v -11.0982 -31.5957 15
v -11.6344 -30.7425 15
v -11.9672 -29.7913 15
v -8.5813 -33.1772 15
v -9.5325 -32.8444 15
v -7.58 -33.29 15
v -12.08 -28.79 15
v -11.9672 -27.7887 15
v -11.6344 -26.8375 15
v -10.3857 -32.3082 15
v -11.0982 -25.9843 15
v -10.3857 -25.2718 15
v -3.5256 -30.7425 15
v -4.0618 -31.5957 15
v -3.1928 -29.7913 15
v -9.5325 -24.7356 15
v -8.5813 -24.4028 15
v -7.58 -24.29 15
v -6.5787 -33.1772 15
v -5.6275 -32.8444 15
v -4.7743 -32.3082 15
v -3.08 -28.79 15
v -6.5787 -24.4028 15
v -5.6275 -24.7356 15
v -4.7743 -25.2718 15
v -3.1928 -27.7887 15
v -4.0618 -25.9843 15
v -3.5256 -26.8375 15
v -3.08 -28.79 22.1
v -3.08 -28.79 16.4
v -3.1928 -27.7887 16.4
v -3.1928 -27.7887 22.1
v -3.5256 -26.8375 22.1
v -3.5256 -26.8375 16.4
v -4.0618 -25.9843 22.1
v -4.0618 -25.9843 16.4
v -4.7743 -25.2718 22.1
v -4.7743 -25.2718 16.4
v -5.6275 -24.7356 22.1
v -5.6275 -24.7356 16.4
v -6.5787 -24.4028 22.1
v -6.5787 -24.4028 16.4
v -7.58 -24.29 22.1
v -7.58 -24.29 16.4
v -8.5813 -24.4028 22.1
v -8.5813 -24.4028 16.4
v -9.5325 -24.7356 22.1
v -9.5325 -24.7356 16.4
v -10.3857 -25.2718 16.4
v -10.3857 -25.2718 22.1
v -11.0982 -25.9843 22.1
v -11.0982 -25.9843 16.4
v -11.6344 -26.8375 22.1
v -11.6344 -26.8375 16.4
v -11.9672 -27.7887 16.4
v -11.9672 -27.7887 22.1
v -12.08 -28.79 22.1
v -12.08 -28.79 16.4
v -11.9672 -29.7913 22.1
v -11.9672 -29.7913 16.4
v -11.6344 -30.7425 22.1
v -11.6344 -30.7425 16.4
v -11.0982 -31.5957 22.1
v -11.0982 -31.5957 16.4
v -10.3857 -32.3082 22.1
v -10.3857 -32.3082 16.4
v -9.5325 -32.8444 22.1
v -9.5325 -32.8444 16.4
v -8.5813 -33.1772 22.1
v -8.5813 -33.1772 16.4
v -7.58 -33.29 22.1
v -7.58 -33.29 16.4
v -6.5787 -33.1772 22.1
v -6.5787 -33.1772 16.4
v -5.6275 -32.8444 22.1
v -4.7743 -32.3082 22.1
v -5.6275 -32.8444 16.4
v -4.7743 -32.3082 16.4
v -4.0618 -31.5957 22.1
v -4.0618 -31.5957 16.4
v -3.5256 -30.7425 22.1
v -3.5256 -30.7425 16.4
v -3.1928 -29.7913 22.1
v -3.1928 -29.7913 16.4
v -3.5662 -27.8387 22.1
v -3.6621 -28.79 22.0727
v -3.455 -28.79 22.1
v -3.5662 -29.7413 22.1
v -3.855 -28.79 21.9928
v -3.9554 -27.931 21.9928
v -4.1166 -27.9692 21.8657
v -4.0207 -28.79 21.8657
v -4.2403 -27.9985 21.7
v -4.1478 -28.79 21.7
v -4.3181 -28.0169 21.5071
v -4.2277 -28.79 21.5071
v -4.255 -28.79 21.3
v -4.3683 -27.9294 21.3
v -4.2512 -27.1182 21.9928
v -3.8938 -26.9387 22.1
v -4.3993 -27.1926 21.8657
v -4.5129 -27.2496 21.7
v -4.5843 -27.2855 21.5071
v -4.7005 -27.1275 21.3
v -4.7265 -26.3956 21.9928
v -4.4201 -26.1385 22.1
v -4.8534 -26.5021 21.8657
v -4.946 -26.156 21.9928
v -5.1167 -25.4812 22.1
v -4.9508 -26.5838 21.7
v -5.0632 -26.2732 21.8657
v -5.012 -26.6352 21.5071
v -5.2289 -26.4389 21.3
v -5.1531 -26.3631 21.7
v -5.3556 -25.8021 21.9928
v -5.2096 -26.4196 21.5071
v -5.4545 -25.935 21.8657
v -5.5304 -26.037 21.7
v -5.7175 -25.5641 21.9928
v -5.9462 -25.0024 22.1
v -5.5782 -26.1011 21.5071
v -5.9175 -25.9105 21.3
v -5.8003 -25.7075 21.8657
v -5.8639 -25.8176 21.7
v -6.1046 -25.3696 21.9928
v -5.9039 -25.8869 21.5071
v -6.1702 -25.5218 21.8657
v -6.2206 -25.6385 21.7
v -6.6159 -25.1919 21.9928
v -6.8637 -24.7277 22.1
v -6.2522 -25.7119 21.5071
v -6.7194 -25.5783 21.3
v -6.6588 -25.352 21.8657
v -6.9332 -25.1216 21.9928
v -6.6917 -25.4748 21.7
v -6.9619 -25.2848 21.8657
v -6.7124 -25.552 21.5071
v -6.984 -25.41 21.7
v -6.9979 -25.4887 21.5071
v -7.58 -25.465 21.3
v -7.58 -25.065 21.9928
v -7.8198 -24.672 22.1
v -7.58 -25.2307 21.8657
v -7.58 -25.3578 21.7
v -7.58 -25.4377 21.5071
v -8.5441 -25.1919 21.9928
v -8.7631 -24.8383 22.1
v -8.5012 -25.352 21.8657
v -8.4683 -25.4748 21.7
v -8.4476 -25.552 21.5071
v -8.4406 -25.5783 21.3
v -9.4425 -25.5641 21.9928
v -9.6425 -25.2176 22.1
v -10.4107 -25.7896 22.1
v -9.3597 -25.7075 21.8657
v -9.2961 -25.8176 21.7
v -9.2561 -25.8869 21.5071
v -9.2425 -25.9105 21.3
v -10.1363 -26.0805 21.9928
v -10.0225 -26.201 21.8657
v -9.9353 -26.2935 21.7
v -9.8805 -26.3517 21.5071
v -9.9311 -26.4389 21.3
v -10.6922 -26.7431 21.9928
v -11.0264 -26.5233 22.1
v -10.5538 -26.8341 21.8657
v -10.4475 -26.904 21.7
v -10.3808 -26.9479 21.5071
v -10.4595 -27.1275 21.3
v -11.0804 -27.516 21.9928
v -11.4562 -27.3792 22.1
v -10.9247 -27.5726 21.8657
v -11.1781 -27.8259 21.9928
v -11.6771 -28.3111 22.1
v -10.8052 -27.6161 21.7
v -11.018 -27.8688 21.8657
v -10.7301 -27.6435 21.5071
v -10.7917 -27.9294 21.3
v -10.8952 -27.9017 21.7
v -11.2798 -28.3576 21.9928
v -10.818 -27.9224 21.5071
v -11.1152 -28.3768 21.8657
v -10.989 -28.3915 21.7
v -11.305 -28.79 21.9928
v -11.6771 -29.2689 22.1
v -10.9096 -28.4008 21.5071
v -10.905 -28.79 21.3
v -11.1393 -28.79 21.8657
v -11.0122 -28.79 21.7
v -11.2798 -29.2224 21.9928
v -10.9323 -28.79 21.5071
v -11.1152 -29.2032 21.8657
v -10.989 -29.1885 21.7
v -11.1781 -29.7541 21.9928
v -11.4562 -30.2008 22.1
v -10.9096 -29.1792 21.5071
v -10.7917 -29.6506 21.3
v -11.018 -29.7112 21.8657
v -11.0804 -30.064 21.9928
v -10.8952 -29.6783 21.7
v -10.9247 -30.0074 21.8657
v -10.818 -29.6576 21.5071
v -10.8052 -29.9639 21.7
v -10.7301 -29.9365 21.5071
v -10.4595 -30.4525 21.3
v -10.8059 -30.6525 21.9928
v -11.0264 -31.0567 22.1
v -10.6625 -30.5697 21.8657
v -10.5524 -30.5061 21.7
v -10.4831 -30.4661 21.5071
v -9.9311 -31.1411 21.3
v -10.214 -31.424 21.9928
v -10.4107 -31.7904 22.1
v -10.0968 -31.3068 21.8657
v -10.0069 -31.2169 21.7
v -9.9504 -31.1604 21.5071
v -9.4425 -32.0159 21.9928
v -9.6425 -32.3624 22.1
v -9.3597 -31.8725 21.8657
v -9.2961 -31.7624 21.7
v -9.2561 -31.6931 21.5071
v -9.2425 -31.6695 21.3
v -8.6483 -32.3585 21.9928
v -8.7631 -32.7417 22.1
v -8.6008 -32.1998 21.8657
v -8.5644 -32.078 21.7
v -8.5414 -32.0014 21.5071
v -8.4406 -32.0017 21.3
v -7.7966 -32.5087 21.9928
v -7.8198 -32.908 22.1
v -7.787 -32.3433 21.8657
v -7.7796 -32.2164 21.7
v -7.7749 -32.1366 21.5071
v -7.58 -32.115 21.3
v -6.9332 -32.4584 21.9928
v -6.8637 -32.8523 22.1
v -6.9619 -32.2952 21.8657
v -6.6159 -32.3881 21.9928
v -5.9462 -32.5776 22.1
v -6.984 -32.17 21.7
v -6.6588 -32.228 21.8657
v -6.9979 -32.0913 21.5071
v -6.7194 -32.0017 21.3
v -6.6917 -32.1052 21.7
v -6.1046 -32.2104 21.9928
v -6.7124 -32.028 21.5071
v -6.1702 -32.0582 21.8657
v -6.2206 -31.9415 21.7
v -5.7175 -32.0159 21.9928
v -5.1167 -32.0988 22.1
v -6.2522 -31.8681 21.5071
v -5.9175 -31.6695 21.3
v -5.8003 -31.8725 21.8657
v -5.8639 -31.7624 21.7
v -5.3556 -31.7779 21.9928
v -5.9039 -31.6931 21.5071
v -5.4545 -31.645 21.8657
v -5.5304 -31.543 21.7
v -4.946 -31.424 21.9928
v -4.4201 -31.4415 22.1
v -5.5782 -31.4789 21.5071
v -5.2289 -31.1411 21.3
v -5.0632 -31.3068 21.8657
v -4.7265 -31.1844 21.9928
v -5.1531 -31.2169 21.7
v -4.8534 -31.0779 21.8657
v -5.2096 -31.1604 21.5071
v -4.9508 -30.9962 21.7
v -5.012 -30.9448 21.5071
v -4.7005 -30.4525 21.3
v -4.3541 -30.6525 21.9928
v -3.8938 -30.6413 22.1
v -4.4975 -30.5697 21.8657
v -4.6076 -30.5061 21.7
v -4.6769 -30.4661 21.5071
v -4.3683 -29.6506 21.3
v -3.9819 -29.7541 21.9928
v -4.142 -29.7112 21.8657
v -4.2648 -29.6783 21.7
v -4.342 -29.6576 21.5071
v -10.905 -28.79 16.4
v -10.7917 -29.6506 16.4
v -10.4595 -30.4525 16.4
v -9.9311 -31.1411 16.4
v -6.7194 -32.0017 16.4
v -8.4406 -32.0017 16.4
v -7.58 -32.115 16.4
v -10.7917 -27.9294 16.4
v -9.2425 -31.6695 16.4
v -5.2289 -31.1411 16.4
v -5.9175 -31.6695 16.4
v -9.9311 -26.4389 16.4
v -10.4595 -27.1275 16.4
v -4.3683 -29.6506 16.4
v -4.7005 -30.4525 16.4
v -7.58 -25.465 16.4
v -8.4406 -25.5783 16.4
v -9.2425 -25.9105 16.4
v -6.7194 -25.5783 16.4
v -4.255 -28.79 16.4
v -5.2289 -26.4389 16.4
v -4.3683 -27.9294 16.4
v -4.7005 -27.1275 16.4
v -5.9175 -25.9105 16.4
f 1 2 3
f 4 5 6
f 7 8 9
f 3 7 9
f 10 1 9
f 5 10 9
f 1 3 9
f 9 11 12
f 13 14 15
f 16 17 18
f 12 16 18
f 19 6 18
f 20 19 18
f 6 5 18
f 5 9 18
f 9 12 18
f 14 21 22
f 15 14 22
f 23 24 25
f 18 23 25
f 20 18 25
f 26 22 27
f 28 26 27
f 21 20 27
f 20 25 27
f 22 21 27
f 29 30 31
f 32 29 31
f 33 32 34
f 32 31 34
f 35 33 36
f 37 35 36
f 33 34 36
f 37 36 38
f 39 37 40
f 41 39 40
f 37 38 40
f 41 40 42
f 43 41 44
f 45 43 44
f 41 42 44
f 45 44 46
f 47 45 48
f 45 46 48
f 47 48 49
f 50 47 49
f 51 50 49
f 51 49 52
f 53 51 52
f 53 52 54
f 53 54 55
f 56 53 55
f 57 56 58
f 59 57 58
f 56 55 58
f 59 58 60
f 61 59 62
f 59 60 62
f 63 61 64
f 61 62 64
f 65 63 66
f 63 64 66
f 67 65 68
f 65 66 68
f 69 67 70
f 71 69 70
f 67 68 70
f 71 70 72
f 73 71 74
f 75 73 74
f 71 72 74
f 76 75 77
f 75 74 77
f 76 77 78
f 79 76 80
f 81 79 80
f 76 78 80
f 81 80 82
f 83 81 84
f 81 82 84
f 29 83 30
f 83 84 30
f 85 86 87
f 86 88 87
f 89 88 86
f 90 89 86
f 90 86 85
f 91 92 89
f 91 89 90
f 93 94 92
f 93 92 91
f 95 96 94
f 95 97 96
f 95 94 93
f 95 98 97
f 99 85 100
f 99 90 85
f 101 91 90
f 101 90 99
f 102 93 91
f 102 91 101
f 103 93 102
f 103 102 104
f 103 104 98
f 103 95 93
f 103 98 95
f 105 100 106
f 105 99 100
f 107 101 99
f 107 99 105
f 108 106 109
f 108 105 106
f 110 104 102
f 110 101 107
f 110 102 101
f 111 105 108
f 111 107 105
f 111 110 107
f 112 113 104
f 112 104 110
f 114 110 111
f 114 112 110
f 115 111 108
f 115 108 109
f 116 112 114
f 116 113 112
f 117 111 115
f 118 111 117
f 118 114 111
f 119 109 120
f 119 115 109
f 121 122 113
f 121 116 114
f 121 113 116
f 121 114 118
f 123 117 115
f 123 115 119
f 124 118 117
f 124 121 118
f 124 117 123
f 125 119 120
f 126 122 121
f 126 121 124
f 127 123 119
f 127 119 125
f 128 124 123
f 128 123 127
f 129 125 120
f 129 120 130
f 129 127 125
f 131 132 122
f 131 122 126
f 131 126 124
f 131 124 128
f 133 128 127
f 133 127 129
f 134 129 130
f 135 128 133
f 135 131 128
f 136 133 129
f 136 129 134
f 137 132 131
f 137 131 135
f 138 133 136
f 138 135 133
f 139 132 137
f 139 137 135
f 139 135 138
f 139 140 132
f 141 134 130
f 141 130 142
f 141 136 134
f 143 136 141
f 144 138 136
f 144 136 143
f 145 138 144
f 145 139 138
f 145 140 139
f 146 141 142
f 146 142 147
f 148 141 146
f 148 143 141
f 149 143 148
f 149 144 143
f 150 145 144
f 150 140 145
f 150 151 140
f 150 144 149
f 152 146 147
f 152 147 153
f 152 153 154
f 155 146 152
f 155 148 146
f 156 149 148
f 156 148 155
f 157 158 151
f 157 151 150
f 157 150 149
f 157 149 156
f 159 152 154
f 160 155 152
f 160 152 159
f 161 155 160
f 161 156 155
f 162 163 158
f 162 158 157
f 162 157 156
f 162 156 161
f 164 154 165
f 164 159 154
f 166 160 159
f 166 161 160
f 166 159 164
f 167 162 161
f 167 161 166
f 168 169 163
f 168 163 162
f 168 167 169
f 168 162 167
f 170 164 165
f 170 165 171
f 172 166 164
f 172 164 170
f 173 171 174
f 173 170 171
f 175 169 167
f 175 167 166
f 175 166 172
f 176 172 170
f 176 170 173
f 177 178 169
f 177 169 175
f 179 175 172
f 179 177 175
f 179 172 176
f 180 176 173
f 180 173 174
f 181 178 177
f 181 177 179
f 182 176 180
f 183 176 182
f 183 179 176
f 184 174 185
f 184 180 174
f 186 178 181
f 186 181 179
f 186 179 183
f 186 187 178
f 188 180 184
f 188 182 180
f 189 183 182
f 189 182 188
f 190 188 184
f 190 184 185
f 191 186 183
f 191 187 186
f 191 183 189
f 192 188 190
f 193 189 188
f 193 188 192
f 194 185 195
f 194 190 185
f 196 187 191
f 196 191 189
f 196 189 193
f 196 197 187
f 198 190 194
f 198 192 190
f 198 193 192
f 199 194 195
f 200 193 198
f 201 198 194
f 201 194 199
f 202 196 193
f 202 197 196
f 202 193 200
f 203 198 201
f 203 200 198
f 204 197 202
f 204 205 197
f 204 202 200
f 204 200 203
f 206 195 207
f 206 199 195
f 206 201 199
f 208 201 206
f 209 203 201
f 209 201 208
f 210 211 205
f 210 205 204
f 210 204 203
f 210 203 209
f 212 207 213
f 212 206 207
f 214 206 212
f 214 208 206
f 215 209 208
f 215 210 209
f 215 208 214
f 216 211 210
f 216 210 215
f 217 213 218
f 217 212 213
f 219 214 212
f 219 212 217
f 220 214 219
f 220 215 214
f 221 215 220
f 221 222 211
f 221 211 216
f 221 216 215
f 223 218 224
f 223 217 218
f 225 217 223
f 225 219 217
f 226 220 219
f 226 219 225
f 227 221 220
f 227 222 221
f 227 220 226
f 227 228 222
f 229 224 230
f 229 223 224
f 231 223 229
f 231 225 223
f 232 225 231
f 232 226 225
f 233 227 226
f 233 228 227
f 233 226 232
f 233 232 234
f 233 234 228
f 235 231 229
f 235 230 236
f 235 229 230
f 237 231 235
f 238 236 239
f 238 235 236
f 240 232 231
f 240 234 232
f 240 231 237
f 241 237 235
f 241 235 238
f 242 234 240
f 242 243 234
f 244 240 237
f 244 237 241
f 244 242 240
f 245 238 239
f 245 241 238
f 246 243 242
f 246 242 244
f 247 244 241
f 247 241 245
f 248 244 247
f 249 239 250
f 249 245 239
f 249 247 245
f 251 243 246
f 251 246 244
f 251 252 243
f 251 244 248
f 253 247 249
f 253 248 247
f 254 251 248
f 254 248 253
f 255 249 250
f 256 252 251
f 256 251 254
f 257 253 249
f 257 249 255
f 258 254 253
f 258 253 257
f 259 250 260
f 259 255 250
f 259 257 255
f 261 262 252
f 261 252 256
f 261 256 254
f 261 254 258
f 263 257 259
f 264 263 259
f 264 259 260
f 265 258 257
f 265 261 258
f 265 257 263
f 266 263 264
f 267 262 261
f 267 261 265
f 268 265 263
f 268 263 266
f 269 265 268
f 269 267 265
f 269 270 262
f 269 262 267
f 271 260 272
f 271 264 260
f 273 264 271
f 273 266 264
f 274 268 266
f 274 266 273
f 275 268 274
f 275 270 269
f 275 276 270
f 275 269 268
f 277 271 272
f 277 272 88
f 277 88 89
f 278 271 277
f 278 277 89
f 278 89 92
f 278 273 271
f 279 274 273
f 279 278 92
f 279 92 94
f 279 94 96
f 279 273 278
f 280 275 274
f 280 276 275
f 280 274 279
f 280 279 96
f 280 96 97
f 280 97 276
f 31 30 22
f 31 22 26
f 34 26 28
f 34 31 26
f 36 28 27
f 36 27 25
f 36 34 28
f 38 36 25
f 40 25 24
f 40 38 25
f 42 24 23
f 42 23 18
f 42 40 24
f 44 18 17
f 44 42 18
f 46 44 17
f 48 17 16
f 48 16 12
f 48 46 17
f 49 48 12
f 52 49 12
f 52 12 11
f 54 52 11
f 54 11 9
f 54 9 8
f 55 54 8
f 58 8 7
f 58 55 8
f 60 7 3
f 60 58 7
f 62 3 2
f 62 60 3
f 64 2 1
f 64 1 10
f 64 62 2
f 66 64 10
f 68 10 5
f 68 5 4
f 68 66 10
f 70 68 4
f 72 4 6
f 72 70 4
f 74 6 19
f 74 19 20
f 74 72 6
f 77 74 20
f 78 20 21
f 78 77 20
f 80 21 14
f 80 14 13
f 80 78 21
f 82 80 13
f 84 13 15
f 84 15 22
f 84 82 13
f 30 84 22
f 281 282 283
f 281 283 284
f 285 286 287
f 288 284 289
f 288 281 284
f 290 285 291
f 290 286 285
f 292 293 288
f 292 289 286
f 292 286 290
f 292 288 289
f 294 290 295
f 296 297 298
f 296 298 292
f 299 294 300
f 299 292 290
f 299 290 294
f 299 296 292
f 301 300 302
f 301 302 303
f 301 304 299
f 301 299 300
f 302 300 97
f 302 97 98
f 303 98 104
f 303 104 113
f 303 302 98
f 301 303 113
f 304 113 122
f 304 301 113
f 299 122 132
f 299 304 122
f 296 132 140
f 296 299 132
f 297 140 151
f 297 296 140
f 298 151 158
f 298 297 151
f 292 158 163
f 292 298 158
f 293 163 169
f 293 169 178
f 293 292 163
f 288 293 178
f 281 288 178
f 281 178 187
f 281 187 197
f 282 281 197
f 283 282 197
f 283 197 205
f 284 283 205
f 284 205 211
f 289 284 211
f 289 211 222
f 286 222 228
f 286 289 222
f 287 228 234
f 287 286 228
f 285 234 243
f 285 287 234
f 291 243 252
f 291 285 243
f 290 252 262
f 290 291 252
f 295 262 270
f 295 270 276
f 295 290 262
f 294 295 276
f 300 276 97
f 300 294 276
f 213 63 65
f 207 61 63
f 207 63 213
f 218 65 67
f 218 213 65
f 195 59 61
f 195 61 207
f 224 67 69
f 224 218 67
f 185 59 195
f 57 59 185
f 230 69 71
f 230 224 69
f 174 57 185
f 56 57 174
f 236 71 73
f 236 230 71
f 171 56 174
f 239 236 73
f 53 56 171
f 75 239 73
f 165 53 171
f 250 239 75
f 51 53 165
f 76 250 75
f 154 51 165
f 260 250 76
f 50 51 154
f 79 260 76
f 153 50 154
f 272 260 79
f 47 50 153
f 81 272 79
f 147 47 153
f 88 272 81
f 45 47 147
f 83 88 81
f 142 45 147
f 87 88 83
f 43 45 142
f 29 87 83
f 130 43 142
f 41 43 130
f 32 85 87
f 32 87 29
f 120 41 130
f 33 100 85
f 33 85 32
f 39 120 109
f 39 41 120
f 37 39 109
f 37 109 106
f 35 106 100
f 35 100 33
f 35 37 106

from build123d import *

# Parameters (mm, degrees)
SKETCH064_R     = 4.5
PAD029_DEPTH    = 1.4
SKETCH065_R     = 4.5
PAD030_DEPTH    = 5.7
SKETCH066_R     = 3.325
POCKET031_DEPTH = 5.7
FILLET002_R     = 0.8


with BuildPart() as part:
    # Sketch064 → Pad029 (new body)
    with BuildSketch(Plane.XY):
        with Locations((-7.58, -28.79)):
            Circle(SKETCH064_R)
    extrude(amount=-PAD029_DEPTH)

    # Sketch065 → Pad030 (join)
    with BuildSketch(Plane.XY):
        with Locations((-7.58, -28.79)):
            Circle(SKETCH065_R)
    extrude(amount=PAD030_DEPTH)

    # Sketch066 → Pocket031 (cut)
    with BuildSketch(Plane.XY):
        with Locations((-7.58, -28.79)):
            Circle(SKETCH066_R)
    extrude(amount=POCKET031_DEPTH, mode=Mode.SUBTRACT)

    # Fillet002
    fillet002_edges = [part.edges().sort_by_distance(p)[0] for p in [
        (-10.905, -28.79, 5.7),
    ]]
    fillet(fillet002_edges, radius=FILLET002_R)


with BuildPart() as part_1:
    # Body009 placement: moved
    add(part.part.moved(Location((0, 0, 16.4))))


solid = part_1.part
